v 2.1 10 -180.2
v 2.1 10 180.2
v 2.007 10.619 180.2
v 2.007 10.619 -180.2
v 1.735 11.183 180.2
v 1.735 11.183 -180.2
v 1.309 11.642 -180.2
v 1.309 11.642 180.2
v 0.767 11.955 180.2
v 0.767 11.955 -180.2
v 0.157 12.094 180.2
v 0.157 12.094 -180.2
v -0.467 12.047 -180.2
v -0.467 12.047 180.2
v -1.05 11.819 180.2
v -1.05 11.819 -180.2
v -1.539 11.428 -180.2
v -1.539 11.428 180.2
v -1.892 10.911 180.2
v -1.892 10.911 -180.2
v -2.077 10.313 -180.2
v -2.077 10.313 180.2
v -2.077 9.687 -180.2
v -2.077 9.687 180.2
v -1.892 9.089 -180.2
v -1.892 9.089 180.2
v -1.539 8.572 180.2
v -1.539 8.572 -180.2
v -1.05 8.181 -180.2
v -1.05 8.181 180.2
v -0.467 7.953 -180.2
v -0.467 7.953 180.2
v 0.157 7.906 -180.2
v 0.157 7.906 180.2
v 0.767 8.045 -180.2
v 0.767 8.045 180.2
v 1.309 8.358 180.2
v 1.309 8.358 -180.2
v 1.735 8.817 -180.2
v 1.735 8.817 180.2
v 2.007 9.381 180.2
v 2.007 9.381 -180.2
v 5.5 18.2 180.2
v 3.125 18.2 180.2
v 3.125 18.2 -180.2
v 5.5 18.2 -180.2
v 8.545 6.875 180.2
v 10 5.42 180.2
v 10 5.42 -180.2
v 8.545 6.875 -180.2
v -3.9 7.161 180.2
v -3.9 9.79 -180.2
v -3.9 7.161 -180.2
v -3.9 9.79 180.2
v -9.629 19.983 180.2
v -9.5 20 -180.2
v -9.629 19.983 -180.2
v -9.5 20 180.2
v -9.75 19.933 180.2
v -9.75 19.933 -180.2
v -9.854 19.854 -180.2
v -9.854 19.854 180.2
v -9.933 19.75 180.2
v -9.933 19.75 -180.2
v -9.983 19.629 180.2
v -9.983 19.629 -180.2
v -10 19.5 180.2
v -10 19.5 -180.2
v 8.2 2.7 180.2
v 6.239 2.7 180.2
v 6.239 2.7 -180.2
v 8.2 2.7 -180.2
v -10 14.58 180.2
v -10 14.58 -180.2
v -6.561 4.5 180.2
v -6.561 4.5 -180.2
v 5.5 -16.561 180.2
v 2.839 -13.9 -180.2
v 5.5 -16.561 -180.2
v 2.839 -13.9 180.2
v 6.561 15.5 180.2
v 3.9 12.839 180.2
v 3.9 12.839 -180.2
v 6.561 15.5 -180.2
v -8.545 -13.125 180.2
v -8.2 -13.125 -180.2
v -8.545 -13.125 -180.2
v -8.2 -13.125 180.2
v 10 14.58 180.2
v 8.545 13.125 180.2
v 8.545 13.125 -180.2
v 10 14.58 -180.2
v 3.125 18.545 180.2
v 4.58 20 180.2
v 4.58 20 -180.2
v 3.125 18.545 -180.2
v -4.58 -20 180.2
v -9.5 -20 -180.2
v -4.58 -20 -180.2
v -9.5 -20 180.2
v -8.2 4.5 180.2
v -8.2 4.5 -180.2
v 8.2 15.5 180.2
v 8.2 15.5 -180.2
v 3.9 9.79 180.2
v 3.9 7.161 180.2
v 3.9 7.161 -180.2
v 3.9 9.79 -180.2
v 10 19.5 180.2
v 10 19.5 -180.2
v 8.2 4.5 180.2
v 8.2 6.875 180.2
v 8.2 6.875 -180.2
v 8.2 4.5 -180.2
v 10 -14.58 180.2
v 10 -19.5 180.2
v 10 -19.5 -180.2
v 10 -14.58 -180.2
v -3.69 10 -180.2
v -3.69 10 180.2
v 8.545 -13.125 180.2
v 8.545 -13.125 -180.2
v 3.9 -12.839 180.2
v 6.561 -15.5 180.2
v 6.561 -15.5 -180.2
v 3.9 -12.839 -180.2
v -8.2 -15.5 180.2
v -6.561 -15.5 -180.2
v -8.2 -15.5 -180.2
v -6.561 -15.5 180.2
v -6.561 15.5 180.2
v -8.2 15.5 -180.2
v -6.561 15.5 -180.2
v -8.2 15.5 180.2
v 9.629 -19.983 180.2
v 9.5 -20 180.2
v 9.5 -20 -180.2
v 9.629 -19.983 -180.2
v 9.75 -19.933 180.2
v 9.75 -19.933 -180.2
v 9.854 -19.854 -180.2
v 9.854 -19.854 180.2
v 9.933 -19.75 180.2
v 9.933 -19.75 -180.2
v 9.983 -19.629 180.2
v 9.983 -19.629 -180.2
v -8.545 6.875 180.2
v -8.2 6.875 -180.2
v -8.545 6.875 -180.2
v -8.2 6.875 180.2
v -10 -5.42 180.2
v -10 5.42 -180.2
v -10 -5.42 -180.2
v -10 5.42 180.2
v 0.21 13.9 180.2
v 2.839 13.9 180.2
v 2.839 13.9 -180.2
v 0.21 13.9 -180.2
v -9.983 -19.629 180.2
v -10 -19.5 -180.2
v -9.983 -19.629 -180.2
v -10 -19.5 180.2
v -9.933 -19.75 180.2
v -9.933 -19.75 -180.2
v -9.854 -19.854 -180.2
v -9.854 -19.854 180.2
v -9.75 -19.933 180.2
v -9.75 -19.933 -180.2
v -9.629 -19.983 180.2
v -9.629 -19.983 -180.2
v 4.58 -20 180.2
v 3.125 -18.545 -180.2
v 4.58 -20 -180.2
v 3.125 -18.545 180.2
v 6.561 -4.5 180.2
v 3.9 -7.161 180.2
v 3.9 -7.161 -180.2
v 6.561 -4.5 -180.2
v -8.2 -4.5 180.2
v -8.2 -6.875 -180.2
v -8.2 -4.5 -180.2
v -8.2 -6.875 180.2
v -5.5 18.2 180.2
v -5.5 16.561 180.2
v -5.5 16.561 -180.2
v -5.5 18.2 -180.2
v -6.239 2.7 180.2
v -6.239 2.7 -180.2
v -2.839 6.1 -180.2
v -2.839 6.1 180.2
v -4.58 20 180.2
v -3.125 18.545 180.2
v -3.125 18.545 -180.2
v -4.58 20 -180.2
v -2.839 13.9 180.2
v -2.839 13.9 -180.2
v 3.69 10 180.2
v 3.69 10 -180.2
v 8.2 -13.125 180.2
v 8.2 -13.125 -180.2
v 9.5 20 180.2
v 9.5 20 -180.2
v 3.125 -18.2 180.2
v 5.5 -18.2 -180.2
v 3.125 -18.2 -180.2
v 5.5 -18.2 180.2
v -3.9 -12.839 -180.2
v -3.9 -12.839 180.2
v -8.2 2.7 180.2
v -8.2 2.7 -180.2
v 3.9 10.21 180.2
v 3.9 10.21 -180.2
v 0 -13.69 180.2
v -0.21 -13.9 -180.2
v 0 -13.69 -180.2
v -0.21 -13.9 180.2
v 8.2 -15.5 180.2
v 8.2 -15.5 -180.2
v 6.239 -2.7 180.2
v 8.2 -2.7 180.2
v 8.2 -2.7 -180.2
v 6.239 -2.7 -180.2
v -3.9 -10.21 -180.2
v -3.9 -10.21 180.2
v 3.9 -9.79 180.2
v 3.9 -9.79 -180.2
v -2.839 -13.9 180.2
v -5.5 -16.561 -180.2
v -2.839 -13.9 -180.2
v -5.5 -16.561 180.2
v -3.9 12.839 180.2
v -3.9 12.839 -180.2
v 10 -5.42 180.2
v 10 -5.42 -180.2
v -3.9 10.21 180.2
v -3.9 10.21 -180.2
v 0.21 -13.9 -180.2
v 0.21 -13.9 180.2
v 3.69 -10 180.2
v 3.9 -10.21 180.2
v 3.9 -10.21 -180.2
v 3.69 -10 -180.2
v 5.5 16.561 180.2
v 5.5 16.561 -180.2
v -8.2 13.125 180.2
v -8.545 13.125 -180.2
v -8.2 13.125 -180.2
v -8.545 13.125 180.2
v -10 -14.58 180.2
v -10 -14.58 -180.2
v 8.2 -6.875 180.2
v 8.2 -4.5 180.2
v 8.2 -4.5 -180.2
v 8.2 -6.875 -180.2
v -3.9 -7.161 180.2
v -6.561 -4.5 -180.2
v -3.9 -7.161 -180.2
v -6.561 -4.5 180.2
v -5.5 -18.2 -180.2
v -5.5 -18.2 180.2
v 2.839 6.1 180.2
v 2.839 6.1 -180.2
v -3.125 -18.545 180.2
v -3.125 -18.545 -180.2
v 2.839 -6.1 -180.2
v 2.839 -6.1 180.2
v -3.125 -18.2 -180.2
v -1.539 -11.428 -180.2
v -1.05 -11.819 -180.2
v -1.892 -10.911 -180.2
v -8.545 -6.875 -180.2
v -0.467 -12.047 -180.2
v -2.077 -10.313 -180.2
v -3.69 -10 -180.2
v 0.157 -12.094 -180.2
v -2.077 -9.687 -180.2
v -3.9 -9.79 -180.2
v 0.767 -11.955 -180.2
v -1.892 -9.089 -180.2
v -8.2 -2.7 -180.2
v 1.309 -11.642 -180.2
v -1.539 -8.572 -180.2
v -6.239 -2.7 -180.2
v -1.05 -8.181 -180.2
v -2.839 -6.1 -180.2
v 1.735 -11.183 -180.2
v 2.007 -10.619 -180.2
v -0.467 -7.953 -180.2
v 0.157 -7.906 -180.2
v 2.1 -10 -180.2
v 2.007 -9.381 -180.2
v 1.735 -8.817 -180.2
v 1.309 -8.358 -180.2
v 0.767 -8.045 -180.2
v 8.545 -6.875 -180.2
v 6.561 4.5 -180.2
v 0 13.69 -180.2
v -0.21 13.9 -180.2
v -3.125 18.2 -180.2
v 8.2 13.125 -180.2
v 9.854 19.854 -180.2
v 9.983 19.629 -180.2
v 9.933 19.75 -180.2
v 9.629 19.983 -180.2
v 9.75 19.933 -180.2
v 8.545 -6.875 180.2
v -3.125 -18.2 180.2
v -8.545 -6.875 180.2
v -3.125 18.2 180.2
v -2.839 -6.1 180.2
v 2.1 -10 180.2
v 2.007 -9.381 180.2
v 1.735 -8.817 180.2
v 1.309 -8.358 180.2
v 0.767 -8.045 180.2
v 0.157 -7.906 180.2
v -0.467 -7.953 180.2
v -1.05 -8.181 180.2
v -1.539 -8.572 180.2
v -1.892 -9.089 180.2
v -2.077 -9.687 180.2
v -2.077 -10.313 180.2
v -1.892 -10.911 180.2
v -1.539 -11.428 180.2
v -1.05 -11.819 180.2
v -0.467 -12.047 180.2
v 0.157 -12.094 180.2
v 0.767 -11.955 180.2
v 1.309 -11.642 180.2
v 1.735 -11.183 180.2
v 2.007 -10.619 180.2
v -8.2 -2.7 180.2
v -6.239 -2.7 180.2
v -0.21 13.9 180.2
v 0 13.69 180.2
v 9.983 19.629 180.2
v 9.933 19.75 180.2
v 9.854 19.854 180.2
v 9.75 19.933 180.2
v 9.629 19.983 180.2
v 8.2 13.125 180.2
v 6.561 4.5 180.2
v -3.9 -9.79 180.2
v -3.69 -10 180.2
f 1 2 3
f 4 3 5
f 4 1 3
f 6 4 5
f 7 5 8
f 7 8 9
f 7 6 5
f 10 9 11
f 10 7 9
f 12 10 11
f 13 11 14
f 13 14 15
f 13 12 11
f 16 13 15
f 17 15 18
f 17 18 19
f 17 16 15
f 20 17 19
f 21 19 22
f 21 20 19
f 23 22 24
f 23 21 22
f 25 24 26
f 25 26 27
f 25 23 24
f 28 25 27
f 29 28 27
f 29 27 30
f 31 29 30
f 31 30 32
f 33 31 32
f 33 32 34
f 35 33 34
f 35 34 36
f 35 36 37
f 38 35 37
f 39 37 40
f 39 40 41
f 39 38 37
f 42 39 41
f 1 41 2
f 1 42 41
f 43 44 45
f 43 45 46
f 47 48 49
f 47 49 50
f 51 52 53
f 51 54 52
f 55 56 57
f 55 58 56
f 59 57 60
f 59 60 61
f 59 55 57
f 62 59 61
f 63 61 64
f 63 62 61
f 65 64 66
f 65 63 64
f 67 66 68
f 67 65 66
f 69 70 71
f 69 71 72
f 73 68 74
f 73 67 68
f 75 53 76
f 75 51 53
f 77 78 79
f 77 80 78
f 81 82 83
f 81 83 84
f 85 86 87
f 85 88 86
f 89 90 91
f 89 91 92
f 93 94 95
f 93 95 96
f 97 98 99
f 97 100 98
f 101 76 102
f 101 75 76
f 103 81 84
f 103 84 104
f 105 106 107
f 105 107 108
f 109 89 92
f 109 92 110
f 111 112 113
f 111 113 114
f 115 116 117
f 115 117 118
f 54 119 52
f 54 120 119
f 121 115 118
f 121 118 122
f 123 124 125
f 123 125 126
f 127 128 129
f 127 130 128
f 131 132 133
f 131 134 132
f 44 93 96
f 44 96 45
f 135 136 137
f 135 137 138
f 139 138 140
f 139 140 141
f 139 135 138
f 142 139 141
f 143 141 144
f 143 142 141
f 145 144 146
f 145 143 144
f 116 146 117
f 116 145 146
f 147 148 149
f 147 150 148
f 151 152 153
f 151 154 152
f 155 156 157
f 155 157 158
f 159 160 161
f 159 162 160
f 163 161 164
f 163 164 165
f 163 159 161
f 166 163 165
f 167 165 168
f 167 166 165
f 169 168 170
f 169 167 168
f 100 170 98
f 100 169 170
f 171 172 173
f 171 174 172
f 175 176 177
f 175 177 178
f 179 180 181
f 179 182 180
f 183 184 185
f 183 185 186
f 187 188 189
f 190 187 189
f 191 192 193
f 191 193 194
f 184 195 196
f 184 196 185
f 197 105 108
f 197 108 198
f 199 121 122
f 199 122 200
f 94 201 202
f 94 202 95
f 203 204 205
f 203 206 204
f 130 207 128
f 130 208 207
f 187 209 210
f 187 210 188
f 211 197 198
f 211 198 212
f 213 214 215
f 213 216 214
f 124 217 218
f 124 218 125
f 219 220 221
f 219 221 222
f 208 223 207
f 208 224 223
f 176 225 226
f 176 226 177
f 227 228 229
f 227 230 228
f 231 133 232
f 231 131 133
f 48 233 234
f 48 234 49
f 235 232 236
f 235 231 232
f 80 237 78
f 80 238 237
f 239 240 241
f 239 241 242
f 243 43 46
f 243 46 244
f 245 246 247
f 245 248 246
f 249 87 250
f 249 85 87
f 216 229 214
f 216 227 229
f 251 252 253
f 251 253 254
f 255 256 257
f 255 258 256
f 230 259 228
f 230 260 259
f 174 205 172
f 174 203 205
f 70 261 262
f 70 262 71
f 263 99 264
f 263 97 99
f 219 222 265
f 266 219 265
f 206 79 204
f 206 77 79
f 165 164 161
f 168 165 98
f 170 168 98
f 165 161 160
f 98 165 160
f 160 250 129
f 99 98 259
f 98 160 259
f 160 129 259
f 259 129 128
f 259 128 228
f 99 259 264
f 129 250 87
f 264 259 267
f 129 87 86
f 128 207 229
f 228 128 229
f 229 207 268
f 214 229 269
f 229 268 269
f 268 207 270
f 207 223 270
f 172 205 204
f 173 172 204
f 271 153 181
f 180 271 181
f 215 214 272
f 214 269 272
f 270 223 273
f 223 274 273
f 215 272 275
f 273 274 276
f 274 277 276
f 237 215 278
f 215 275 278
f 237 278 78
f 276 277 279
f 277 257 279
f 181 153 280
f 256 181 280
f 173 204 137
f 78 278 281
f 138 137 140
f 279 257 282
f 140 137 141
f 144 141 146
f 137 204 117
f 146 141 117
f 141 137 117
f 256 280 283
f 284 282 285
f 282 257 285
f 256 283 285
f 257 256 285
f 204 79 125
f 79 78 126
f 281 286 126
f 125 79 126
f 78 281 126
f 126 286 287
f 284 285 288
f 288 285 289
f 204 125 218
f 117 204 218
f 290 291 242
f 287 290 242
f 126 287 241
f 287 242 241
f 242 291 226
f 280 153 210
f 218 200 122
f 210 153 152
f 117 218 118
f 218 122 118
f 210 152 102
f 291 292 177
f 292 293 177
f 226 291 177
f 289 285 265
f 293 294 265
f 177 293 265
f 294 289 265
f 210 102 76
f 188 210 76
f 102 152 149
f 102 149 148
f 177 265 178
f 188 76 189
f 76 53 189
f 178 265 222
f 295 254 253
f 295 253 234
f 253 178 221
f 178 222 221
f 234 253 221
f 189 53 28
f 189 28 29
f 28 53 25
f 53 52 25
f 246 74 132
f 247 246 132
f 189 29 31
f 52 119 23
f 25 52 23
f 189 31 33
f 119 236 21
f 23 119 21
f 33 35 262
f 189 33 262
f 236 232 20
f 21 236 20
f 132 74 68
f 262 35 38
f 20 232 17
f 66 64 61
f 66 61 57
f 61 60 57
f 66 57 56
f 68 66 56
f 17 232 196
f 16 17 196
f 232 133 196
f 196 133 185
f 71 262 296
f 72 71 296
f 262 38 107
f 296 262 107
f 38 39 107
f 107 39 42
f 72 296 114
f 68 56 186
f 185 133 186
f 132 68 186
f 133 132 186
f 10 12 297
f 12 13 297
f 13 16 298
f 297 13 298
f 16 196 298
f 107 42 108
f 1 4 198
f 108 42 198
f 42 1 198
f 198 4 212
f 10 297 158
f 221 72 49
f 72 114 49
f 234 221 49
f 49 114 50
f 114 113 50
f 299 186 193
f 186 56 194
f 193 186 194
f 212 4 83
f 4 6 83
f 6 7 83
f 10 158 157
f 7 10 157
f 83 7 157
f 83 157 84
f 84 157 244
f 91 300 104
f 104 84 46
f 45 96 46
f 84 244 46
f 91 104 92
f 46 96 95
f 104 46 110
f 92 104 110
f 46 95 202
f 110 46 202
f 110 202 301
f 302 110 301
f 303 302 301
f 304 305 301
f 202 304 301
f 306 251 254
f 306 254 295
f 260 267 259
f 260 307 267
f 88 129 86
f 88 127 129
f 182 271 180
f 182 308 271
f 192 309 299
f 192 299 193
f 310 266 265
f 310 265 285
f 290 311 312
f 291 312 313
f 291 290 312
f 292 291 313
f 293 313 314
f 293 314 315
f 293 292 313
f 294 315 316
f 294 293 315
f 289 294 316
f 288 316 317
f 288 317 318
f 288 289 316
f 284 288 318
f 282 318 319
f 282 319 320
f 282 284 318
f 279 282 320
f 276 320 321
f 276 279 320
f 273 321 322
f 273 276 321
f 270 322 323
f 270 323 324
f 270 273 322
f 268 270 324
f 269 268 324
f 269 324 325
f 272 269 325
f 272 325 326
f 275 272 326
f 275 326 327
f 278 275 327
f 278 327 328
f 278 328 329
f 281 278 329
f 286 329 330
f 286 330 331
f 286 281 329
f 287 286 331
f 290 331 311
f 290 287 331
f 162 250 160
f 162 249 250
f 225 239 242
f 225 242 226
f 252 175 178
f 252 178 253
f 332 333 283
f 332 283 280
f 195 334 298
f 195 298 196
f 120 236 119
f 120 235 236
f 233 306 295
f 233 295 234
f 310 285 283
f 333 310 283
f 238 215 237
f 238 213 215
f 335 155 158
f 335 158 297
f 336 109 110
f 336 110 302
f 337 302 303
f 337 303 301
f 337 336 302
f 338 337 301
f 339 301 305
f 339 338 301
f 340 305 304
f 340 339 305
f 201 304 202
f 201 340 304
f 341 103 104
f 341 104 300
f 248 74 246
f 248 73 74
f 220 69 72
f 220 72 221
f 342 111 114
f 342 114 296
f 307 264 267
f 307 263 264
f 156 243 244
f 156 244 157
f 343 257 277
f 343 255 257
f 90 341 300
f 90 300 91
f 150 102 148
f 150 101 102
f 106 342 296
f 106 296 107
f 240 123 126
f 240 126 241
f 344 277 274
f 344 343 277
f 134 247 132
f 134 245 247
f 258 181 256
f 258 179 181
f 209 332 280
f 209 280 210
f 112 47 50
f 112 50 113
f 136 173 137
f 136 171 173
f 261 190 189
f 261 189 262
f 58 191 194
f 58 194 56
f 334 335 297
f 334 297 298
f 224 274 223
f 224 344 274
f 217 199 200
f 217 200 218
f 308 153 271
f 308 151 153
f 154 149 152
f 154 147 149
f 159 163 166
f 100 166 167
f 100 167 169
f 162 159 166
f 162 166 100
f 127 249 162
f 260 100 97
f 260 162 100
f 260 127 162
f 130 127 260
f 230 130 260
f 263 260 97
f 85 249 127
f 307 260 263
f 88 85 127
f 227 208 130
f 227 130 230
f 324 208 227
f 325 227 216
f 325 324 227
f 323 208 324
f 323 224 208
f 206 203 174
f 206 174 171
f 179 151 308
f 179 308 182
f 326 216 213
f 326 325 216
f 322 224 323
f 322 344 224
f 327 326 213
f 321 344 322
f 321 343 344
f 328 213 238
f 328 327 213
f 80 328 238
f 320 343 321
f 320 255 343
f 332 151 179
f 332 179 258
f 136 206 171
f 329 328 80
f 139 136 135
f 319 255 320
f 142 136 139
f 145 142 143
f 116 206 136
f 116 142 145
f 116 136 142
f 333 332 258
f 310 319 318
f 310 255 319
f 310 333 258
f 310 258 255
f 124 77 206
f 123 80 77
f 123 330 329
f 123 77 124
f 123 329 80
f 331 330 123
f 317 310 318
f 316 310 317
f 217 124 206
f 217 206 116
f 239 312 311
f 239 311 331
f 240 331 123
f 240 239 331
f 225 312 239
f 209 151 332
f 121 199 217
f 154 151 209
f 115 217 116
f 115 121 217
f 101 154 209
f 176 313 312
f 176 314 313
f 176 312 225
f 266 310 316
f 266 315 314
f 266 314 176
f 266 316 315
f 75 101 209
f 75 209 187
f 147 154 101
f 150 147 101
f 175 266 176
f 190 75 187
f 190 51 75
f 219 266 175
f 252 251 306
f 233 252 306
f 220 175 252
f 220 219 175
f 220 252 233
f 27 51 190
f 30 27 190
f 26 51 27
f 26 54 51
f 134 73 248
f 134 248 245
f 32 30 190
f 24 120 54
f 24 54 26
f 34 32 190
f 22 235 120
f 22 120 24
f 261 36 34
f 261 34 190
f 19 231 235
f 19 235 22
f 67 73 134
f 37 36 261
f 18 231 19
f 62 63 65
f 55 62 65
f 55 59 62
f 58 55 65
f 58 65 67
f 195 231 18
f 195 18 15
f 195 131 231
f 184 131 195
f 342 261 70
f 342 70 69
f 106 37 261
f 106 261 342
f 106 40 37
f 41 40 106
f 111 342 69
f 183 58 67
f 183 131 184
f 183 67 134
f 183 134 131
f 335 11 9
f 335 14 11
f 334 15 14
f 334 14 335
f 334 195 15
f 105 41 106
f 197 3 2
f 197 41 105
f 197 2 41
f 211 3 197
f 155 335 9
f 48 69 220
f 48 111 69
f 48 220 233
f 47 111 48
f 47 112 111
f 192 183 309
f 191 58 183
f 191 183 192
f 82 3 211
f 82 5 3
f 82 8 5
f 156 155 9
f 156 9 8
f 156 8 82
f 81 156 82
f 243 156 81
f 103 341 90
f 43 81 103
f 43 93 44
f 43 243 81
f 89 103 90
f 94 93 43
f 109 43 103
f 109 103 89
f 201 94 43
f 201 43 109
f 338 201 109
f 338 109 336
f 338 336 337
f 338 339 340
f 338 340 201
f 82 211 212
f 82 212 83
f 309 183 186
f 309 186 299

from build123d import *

# Parameters (mm, degrees)
SKETCH1_R           = 2.1
BOSS_EXTRUDE1_DEPTH = 180.2


with BuildPart() as part:
    # Sketch1 → Boss-Extrude1 (new, symmetric)
    with BuildSketch(Plane.XY):
        with BuildLine():
            Line((4.58, -20), (9.5, -20))
            ThreePointArc((9.5, -20), (9.853553391, -19.853553391), (10, -19.5))
            Line((10, -19.5), (10, -14.58))
            Line((10, -14.58), (8.545, -13.125))
            Line((8.545, -13.125), (8.2, -13.125))
            Line((8.2, -13.125), (8.2, -15.5))
            Line((8.2, -15.5), (6.560660172, -15.5))
            Line((6.560660172, -15.5), (3.9, -12.839339828))
            Line((3.9, -12.839339828), (3.9, -10.21))
            Line((3.9, -10.21), (3.69, -10))
            Line((3.69, -10), (3.9, -9.79))
            Line((3.9, -9.79), (3.9, -7.160660172))
            Line((3.9, -7.160660172), (6.560660172, -4.5))
            Line((6.560660172, -4.5), (8.2, -4.5))
            Line((8.2, -4.5), (8.2, -6.875))
            Line((8.2, -6.875), (8.545, -6.875))
            Line((8.545, -6.875), (10, -5.42))
            Line((10, -5.42), (10, 5.42))
            Line((10, 5.42), (8.545, 6.875))
            Line((8.545, 6.875), (8.2, 6.875))
            Line((8.2, 6.875), (8.2, 4.5))
            Line((8.2, 4.5), (6.560660172, 4.5))
            Line((6.560660172, 4.5), (3.9, 7.160660172))
            Line((3.9, 7.160660172), (3.9, 9.79))
            Line((3.9, 9.79), (3.69, 10))
            Line((3.69, 10), (3.9, 10.21))
            Line((3.9, 10.21), (3.9, 12.839339828))
            Line((3.9, 12.839339828), (6.560660172, 15.5))
            Line((6.560660172, 15.5), (8.2, 15.5))
            Line((8.2, 15.5), (8.2, 13.125))
            Line((8.2, 13.125), (8.545, 13.125))
            Line((8.545, 13.125), (10, 14.58))
            Line((10, 14.58), (10, 19.5))
            ThreePointArc((10, 19.5), (9.853553391, 19.853553391), (9.5, 20))
            Line((9.5, 20), (4.58, 20))
            Line((4.58, 20), (3.125, 18.545))
            Line((3.125, 18.545), (3.125, 18.2))
            Line((3.125, 18.2), (5.5, 18.2))
            Line((5.5, 18.2), (5.5, 16.560660172))
            Line((5.5, 16.560660172), (2.839339828, 13.9))
            Line((2.839339828, 13.9), (0.21, 13.9))
            Line((0.21, 13.9), (0, 13.69))
            Line((0, 13.69), (-0.21, 13.9))
            Line((-0.21, 13.9), (-2.839339828, 13.9))
            Line((-2.839339828, 13.9), (-5.5, 16.560660172))
            Line((-5.5, 16.560660172), (-5.5, 18.2))
            Line((-5.5, 18.2), (-3.125, 18.2))
            Line((-3.125, 18.2), (-3.125, 18.545))
            Line((-3.125, 18.545), (-4.58, 20))
            Line((-4.58, 20), (-9.5, 20))
            ThreePointArc((-9.5, 20), (-9.853553391, 19.853553391), (-10, 19.5))
            Line((-10, 19.5), (-10, 14.58))
            Line((-10, 14.58), (-8.545, 13.125))
            Line((-8.545, 13.125), (-8.2, 13.125))
            Line((-8.2, 13.125), (-8.2, 15.5))
            Line((-8.2, 15.5), (-6.560660172, 15.5))
            Line((-6.560660172, 15.5), (-3.9, 12.839339828))
            Line((-3.9, 12.839339828), (-3.9, 10.21))
            Line((-3.9, 10.21), (-3.69, 10))
            Line((-3.69, 10), (-3.9, 9.79))
            Line((-3.9, 9.79), (-3.9, 7.160660172))
            Line((-3.9, 7.160660172), (-6.560660172, 4.5))
            Line((-6.560660172, 4.5), (-8.2, 4.5))
            Line((-8.2, 4.5), (-8.2, 6.875))
            Line((-8.2, 6.875), (-8.545, 6.875))
            Line((-8.545, 6.875), (-10, 5.42))
            Line((-10, 5.42), (-10, -5.42))
            Line((-10, -5.42), (-8.545, -6.875))
            Line((-8.545, -6.875), (-8.2, -6.875))
            Line((-8.2, -6.875), (-8.2, -4.5))
            Line((-8.2, -4.5), (-6.560660172, -4.5))
            Line((-6.560660172, -4.5), (-3.9, -7.160660172))
            Line((-3.9, -7.160660172), (-3.9, -9.79))
            Line((-3.9, -9.79), (-3.69, -10))
            Line((-3.69, -10), (-3.9, -10.21))
            Line((-3.9, -10.21), (-3.9, -12.839339828))
            Line((-3.9, -12.839339828), (-6.560660172, -15.5))
            Line((-6.560660172, -15.5), (-8.2, -15.5))
            Line((-8.2, -15.5), (-8.2, -13.125))
            Line((-8.2, -13.125), (-8.545, -13.125))
            Line((-8.545, -13.125), (-10, -14.58))
            Line((-10, -14.58), (-10, -19.5))
            ThreePointArc((-10, -19.5), (-9.853553391, -19.853553391), (-9.5, -20))
            Line((-9.5, -20), (-4.58, -20))
            Line((-4.58, -20), (-3.125, -18.545))
            Line((-3.125, -18.545), (-3.125, -18.2))
            Line((-3.125, -18.2), (-5.5, -18.2))
            Line((-5.5, -18.2), (-5.5, -16.560660172))
            Line((-5.5, -16.560660172), (-2.839339828, -13.9))
            Line((-2.839339828, -13.9), (-0.21, -13.9))
            Line((-0.21, -13.9), (0, -13.69))
            Line((0, -13.69), (0.21, -13.9))
            Line((0.21, -13.9), (2.839339828, -13.9))
            Line((2.839339828, -13.9), (5.5, -16.560660172))
            Line((5.5, -16.560660172), (5.5, -18.2))
            Line((5.5, -18.2), (3.125, -18.2))
            Line((3.125, -18.2), (3.125, -18.545))
            Line((3.125, -18.545), (4.58, -20))
        make_face()
        with Locations((0, -10)):
            Circle(SKETCH1_R, mode=Mode.SUBTRACT)
        Polygon((-6.239339828, -2.7), (-8.2, -2.7), (-8.2, 2.7), (-6.239339828, 2.7), (-2.839339828, 6.1), (2.839339828, 6.1), (6.239339828, 2.7), (8.2, 2.7), (8.2, -2.7), (6.239339828, -2.7), (2.839339828, -6.1), (-2.839339828, -6.1), align=None, mode=Mode.SUBTRACT)
        with Locations((0, 10)):
            Circle(SKETCH1_R, mode=Mode.SUBTRACT)
    extrude(amount=BOSS_EXTRUDE1_DEPTH, both=True)


solid = part.part
